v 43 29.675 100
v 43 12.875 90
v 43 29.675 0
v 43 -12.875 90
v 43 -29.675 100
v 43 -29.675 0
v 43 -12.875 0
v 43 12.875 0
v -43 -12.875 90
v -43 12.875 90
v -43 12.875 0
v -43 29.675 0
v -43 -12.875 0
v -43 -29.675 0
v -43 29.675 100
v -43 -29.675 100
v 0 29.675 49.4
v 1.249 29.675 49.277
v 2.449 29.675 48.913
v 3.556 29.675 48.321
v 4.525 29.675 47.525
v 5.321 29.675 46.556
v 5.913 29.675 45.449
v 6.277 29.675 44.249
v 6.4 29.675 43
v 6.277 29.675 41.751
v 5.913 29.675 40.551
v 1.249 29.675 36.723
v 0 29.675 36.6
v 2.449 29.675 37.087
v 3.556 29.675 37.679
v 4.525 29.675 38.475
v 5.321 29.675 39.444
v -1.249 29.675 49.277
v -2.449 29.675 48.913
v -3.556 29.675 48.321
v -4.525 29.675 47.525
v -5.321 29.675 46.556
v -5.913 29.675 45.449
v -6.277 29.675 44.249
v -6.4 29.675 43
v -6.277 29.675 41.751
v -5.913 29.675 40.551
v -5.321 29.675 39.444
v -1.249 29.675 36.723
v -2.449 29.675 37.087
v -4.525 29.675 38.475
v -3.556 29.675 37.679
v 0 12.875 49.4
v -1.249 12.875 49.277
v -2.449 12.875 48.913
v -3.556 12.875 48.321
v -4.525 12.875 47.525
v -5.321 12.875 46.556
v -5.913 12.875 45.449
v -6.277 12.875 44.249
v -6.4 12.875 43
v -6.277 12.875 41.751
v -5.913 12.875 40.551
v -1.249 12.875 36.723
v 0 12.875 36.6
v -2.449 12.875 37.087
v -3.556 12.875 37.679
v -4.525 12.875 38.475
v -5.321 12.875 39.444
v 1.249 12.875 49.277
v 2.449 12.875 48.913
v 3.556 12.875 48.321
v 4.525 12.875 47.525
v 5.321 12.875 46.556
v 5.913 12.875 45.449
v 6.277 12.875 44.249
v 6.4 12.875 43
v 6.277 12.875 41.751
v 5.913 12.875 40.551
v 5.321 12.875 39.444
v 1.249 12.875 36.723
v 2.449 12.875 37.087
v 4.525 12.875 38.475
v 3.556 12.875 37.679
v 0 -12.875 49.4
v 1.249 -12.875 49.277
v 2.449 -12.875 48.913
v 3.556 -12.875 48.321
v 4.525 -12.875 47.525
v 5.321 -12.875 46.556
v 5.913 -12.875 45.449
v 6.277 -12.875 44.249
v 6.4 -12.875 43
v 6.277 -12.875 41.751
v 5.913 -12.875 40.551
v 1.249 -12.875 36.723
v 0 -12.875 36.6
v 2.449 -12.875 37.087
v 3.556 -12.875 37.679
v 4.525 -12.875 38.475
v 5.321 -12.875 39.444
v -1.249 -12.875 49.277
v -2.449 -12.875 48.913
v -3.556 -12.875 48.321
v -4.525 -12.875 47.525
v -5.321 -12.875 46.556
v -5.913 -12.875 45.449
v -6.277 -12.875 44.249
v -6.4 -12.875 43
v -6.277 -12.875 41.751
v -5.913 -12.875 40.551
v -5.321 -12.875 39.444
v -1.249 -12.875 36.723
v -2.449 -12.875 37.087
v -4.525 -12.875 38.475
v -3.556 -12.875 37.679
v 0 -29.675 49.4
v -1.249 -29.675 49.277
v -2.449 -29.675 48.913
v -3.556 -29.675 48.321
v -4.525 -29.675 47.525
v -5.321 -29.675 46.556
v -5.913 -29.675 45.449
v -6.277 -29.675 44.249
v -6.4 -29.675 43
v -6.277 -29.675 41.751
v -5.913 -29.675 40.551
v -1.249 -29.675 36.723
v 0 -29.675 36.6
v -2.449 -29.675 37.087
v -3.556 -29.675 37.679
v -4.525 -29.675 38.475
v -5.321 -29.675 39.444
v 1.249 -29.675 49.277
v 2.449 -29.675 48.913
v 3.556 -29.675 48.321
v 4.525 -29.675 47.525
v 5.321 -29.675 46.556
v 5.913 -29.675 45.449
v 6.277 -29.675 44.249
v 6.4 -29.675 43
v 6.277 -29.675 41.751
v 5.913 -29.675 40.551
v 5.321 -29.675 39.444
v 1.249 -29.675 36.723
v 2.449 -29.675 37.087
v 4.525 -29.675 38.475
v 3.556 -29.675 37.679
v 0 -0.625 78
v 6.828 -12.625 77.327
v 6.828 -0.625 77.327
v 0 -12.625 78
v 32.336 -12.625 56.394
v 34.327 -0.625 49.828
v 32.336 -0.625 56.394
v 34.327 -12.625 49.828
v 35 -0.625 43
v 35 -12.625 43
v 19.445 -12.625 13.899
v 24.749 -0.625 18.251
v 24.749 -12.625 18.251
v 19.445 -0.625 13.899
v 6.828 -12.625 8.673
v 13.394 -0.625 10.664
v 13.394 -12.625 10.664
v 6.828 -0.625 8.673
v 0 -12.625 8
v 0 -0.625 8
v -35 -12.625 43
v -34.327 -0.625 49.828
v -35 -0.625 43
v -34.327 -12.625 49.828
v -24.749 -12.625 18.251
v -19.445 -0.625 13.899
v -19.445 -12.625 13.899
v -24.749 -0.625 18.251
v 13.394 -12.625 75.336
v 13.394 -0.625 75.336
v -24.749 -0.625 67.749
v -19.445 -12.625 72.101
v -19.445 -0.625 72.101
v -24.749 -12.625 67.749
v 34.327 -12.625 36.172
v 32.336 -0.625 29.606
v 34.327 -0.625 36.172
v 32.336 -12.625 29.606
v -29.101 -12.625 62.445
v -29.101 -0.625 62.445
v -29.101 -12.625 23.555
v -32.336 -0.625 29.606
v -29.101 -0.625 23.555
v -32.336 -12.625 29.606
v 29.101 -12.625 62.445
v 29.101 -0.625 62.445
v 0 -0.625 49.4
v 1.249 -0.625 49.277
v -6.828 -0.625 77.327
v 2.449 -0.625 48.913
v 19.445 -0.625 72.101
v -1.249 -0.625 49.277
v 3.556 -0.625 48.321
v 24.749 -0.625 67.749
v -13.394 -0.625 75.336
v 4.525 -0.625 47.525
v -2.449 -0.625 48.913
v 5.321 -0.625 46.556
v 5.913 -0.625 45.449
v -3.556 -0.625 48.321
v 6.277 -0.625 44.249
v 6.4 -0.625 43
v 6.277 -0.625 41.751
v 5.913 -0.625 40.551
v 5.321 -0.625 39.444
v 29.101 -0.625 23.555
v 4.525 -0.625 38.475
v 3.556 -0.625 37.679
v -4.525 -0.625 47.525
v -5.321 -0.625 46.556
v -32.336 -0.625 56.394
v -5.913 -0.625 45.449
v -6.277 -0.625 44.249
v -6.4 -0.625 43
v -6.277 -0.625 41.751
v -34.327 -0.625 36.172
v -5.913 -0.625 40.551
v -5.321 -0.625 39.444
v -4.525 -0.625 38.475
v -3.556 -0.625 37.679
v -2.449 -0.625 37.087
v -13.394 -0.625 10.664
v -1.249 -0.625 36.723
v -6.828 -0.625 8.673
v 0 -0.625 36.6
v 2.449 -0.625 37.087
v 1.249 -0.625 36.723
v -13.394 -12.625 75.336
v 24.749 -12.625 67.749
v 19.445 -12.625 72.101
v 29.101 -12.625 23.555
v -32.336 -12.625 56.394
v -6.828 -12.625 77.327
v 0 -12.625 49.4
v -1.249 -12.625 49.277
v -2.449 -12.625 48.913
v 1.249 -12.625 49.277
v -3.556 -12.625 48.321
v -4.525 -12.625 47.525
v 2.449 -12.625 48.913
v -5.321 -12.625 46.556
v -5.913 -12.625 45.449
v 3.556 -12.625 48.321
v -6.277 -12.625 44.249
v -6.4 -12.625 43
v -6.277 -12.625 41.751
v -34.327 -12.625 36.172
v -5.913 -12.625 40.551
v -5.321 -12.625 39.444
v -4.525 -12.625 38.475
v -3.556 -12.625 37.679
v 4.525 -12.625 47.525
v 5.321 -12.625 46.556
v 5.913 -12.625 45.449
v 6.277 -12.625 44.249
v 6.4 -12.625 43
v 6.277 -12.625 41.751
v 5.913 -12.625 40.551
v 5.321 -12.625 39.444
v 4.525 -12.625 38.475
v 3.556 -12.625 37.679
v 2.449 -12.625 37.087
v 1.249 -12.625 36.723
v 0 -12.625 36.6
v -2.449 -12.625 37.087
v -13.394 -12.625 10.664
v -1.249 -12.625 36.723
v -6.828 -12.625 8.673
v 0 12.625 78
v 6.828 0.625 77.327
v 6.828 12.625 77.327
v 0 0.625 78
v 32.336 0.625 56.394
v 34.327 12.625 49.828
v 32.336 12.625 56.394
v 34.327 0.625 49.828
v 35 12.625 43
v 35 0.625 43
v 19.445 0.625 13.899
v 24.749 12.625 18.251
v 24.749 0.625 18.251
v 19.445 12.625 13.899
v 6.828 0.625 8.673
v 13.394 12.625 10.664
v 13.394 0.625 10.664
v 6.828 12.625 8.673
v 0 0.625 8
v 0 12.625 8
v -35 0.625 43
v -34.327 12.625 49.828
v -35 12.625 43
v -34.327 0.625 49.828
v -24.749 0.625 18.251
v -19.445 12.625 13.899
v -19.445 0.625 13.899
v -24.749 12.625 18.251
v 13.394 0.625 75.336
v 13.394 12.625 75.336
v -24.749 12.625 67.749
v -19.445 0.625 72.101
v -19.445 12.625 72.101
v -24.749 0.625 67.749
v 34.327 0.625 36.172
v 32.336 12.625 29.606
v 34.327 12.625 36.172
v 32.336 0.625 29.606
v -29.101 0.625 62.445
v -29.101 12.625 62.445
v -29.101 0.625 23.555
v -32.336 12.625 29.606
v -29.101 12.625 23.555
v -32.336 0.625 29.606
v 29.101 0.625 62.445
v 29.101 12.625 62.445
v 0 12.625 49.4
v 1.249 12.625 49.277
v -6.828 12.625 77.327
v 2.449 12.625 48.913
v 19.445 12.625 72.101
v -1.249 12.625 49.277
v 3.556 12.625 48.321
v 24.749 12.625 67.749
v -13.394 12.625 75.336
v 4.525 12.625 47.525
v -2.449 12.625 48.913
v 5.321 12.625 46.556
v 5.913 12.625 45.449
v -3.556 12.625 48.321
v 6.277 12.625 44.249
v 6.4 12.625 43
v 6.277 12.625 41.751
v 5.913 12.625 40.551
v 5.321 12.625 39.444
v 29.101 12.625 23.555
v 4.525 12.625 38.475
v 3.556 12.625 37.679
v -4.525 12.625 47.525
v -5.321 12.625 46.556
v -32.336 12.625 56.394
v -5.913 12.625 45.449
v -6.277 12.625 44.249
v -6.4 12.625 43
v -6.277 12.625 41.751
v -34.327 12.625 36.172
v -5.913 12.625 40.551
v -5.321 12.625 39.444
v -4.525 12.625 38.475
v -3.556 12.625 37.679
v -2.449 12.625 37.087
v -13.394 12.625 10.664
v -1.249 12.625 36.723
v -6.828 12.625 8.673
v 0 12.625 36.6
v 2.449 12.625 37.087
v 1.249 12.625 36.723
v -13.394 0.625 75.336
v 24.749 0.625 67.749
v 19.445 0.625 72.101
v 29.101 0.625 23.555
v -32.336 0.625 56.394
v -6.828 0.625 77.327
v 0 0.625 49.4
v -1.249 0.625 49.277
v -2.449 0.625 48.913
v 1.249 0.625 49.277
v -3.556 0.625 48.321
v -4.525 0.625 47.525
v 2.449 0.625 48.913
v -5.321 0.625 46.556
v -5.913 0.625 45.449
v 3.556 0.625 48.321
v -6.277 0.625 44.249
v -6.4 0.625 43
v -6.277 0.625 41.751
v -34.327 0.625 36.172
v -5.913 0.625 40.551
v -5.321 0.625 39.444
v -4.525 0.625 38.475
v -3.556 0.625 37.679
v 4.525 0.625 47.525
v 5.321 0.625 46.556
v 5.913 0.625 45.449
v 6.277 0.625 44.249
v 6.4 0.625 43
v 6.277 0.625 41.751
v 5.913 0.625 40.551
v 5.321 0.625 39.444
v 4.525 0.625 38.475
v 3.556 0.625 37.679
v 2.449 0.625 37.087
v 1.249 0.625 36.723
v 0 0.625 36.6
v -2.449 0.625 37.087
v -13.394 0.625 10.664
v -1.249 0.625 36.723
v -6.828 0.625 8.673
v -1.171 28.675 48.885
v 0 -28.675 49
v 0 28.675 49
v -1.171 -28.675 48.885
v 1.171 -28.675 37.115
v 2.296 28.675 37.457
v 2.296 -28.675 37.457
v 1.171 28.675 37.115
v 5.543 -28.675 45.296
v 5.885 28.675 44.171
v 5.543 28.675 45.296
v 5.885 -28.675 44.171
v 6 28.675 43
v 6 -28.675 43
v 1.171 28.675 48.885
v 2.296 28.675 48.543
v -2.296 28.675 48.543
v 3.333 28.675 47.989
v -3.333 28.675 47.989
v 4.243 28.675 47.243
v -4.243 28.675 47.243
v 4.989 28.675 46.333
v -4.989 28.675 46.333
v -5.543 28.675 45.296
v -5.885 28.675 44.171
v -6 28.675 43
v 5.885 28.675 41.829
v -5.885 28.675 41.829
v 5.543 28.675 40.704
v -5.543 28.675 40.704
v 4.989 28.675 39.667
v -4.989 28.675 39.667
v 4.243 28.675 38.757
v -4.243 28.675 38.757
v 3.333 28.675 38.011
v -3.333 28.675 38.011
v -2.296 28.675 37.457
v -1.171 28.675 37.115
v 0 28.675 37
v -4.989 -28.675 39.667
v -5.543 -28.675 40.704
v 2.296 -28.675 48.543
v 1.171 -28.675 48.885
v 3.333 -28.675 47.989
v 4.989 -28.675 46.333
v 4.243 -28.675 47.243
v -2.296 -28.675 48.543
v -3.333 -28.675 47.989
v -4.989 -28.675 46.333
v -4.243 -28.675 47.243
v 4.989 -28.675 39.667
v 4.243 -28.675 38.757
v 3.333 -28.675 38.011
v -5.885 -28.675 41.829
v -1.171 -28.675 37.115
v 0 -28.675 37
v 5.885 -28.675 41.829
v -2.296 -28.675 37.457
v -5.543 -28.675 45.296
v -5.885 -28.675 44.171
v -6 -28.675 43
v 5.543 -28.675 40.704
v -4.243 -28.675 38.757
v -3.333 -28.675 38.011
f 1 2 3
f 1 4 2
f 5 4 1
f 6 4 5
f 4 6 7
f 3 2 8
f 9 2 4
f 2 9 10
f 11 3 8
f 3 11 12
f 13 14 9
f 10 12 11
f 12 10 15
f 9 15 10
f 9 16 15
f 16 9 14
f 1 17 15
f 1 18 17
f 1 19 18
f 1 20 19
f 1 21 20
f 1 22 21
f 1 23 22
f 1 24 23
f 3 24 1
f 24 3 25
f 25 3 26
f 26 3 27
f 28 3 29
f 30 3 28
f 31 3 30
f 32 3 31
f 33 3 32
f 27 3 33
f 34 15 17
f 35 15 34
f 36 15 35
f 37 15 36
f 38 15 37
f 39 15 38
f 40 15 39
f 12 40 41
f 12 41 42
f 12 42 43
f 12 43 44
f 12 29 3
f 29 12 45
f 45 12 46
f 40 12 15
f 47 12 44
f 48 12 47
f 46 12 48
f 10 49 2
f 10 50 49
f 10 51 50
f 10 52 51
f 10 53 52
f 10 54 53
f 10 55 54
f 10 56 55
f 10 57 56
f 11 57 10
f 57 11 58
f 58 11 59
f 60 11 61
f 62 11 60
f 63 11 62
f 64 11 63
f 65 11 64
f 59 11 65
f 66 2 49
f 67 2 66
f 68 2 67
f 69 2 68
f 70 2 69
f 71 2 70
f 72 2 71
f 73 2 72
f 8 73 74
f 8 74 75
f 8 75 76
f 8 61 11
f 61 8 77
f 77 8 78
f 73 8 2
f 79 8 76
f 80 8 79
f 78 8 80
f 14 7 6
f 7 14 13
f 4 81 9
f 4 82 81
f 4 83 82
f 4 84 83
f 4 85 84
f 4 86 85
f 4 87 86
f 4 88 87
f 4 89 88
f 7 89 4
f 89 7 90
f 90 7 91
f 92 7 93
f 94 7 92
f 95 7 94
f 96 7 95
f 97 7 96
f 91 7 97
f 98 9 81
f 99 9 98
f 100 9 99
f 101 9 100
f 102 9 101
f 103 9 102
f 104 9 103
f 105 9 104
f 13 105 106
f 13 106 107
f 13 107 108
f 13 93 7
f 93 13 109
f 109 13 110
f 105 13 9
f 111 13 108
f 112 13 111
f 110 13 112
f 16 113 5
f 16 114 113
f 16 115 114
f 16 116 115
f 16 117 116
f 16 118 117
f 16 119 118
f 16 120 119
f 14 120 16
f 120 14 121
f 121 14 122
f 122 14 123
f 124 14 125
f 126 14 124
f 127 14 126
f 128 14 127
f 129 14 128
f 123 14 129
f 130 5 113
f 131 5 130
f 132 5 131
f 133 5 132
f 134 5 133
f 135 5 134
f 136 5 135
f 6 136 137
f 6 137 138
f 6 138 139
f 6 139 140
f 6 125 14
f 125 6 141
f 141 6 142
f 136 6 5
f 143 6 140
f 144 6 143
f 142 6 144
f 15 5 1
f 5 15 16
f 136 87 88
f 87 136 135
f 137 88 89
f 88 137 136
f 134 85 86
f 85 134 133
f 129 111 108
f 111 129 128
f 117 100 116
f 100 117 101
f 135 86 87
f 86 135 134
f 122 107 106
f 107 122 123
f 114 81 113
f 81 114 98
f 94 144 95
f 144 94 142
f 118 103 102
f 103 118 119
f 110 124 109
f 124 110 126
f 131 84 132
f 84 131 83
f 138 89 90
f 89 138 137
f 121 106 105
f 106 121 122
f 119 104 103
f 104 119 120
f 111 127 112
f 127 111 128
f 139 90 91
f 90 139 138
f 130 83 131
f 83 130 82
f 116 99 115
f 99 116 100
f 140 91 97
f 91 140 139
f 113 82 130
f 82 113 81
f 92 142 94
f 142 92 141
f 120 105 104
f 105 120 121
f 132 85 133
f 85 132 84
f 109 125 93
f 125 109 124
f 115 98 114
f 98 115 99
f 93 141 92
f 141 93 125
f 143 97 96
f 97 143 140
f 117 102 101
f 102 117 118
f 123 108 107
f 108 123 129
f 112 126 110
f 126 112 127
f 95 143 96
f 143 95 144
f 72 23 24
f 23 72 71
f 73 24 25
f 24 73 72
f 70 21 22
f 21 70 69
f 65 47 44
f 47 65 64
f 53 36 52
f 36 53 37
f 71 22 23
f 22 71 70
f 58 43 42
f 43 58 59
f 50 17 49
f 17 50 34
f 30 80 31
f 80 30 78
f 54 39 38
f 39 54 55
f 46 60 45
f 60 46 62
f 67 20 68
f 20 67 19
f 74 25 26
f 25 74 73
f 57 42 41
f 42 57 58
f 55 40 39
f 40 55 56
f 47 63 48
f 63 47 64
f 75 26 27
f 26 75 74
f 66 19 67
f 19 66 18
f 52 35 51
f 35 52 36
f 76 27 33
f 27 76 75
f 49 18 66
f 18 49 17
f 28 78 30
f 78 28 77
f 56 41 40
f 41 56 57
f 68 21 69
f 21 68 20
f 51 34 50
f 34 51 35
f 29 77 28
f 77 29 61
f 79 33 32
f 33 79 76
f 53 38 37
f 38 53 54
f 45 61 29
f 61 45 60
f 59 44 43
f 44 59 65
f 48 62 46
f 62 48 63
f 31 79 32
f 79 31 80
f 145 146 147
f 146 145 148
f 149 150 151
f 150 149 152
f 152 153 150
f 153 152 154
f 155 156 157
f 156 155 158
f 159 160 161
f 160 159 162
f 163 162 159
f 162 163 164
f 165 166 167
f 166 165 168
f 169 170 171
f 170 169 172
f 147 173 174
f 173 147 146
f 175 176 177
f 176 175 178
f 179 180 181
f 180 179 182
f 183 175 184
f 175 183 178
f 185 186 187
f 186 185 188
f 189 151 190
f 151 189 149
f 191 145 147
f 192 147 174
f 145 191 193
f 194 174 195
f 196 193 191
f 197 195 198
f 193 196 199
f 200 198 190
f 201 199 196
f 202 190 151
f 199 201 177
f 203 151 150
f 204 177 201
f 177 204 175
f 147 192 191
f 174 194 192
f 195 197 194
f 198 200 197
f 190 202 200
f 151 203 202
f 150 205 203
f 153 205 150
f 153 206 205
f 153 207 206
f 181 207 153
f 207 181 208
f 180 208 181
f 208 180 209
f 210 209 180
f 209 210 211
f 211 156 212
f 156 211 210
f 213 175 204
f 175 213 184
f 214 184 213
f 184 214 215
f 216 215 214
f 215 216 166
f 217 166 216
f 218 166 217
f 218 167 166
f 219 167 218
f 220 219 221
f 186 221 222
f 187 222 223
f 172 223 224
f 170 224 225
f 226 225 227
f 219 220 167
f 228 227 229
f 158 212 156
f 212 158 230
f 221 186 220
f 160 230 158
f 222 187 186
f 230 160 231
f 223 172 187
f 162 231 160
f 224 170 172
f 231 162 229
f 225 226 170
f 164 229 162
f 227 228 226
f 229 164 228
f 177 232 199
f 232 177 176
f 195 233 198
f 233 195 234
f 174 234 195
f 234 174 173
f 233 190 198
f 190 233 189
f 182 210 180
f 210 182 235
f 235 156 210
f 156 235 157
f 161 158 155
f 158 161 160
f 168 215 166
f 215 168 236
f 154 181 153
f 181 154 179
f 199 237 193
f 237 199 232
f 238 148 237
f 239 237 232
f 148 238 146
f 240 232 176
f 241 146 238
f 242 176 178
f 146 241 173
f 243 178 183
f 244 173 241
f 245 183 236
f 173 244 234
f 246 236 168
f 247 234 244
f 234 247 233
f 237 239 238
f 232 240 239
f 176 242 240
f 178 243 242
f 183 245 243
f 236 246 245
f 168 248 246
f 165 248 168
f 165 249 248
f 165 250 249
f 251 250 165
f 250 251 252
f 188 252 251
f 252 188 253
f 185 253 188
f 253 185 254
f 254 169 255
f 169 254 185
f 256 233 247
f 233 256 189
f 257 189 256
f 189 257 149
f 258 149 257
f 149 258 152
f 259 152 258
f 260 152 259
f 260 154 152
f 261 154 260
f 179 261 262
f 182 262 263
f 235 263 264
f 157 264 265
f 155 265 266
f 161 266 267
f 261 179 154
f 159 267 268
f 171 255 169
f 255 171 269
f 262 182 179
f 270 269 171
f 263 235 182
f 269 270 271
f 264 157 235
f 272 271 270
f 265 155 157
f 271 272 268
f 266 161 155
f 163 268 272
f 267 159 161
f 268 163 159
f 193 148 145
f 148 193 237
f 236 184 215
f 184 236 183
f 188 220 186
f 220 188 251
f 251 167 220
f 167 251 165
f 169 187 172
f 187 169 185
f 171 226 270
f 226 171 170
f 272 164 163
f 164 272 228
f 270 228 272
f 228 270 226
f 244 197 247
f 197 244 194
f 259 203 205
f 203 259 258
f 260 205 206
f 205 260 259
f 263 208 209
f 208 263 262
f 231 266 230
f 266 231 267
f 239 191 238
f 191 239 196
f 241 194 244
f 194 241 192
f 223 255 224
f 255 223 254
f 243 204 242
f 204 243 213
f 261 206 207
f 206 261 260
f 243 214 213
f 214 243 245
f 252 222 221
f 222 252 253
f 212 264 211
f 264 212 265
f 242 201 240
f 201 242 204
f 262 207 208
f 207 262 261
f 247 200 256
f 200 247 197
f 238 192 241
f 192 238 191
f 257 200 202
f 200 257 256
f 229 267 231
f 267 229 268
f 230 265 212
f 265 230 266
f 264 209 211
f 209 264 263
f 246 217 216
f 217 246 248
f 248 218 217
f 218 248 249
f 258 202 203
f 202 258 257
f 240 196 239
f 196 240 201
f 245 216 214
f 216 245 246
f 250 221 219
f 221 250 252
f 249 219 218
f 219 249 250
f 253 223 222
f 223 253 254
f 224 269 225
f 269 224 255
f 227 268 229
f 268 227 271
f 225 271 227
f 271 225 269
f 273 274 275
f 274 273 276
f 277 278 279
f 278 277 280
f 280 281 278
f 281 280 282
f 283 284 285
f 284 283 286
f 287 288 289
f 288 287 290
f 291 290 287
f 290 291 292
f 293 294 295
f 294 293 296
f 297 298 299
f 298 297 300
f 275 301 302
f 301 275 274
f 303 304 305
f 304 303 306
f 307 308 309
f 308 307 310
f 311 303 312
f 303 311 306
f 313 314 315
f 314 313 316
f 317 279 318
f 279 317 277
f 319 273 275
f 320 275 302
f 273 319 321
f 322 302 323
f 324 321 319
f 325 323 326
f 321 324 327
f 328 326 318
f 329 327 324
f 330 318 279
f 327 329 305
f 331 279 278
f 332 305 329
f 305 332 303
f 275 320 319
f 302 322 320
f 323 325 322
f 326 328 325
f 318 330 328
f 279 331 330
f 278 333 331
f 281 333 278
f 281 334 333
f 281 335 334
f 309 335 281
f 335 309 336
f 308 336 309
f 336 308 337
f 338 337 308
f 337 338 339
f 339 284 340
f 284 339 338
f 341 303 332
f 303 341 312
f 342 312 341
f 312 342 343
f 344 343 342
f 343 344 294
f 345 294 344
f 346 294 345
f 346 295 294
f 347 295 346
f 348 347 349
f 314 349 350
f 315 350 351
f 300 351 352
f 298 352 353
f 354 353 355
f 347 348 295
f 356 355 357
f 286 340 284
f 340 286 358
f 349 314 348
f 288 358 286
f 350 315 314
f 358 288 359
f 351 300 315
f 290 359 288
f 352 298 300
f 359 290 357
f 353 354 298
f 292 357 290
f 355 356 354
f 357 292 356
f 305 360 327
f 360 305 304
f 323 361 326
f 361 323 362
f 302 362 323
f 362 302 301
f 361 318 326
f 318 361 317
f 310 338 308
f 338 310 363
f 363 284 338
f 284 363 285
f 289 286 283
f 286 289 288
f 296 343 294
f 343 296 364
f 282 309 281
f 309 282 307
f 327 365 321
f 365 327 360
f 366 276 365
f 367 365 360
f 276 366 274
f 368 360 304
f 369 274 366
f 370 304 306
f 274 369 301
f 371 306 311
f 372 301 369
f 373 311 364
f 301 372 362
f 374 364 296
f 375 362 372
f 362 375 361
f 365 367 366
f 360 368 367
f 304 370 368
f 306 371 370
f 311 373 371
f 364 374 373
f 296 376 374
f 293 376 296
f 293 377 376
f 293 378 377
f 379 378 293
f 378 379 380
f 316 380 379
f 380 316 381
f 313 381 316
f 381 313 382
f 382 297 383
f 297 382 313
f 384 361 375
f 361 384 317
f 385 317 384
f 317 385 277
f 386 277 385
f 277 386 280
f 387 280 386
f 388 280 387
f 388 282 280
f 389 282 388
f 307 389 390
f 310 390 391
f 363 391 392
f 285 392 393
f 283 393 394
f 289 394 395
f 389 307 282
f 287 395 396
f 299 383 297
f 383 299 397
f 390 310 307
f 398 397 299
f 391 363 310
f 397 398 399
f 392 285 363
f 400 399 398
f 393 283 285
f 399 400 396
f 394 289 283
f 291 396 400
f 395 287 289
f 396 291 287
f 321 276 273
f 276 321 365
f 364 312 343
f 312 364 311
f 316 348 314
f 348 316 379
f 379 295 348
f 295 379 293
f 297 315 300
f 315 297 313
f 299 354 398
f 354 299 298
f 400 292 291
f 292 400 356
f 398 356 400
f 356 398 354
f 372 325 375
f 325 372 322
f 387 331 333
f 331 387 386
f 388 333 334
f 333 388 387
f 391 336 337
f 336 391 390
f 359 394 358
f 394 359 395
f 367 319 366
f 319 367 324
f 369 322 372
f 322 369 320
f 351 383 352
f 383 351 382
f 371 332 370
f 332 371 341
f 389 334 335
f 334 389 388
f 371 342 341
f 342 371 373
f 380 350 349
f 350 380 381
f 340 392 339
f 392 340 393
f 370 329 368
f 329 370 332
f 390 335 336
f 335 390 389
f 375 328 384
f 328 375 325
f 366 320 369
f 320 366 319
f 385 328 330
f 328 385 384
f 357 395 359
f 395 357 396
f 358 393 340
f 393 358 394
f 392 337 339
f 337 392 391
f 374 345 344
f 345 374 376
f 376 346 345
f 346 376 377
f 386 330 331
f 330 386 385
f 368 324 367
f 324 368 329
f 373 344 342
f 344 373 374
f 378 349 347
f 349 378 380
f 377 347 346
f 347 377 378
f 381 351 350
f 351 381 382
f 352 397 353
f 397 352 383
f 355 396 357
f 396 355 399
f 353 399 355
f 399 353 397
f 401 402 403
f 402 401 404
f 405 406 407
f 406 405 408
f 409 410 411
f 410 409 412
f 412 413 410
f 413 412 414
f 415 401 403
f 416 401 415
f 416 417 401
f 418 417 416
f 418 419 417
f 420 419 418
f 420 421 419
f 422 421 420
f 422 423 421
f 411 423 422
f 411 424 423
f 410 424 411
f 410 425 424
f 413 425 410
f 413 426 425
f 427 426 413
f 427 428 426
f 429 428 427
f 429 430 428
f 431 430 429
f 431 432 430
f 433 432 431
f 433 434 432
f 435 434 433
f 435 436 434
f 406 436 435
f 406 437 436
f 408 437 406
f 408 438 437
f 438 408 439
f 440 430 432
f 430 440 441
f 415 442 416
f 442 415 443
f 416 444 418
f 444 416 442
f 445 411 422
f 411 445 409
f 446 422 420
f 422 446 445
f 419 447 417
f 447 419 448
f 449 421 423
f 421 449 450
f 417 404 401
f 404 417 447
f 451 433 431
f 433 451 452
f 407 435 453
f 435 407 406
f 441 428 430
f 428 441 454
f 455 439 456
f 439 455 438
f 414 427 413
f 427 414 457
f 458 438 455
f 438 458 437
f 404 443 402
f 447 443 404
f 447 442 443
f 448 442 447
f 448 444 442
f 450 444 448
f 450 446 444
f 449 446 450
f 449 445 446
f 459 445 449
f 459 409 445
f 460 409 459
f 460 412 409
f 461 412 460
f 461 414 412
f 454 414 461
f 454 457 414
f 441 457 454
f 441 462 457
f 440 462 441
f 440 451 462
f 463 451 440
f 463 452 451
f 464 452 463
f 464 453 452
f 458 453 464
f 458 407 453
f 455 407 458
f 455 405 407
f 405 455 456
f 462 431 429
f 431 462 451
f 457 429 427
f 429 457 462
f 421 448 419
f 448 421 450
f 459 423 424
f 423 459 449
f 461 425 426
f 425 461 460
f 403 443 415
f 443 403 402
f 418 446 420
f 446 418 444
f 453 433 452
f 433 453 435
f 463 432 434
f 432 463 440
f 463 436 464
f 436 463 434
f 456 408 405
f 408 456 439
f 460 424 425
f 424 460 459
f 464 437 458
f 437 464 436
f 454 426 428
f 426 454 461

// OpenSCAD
$fn = 32;

// ------------------------------------------------------------------------
// Trolley wheel set: wheels d70, fork 90 mm tall
// Every part is its own module, assembly() places every instance.
// ------------------------------------------------------------------------

// --- part 1 ---
module trolley_fork() {
  difference() {
    union() {
      translate([-43, 12.875, 0]) cube([86, 16.8, 90]);
      translate([-43, -29.675, 0]) cube([86, 16.8, 90]);
      translate([-43, -29.675, 90]) cube([86, 59.35, 10]);
    }
    translate([0, -21.275, 43]) rotate([90, 0, 0]) cylinder(h = 18.8, d = 12.8, center = true);
    translate([0, 21.275, 43]) rotate([90, 0, 0]) cylinder(h = 18.8, d = 12.8, center = true);
  }
}

// --- part 2 ---
module trolley_wheel() {
  difference() {
      translate([0, 0, 0]) cylinder(h = 12, d = 70);
      translate([0, 0, -1]) cylinder(h = 14, d = 12.8);
    }
}

// --- part 3 ---
module trolley_axle() {
  translate([0, 0, -28.675]) cylinder(h = 57.35, d = 12);
}

// --- assembly ---
module assembly() {
  color([0.80, 0.24, 0.20]) translate([0, 0, 0]) rotate([0, 0, 0]) trolley_fork();
  color([0.20, 0.45, 0.75]) translate([0, -0.625, 43]) rotate([90, 0, 0]) trolley_wheel();
  color([0.25, 0.62, 0.32]) translate([0, 12.625, 43]) rotate([90, 0, 0]) trolley_wheel();
  color([0.92, 0.70, 0.18]) translate([0, 0, 43]) rotate([90, 0, 0]) trolley_axle();
}

assembly();
